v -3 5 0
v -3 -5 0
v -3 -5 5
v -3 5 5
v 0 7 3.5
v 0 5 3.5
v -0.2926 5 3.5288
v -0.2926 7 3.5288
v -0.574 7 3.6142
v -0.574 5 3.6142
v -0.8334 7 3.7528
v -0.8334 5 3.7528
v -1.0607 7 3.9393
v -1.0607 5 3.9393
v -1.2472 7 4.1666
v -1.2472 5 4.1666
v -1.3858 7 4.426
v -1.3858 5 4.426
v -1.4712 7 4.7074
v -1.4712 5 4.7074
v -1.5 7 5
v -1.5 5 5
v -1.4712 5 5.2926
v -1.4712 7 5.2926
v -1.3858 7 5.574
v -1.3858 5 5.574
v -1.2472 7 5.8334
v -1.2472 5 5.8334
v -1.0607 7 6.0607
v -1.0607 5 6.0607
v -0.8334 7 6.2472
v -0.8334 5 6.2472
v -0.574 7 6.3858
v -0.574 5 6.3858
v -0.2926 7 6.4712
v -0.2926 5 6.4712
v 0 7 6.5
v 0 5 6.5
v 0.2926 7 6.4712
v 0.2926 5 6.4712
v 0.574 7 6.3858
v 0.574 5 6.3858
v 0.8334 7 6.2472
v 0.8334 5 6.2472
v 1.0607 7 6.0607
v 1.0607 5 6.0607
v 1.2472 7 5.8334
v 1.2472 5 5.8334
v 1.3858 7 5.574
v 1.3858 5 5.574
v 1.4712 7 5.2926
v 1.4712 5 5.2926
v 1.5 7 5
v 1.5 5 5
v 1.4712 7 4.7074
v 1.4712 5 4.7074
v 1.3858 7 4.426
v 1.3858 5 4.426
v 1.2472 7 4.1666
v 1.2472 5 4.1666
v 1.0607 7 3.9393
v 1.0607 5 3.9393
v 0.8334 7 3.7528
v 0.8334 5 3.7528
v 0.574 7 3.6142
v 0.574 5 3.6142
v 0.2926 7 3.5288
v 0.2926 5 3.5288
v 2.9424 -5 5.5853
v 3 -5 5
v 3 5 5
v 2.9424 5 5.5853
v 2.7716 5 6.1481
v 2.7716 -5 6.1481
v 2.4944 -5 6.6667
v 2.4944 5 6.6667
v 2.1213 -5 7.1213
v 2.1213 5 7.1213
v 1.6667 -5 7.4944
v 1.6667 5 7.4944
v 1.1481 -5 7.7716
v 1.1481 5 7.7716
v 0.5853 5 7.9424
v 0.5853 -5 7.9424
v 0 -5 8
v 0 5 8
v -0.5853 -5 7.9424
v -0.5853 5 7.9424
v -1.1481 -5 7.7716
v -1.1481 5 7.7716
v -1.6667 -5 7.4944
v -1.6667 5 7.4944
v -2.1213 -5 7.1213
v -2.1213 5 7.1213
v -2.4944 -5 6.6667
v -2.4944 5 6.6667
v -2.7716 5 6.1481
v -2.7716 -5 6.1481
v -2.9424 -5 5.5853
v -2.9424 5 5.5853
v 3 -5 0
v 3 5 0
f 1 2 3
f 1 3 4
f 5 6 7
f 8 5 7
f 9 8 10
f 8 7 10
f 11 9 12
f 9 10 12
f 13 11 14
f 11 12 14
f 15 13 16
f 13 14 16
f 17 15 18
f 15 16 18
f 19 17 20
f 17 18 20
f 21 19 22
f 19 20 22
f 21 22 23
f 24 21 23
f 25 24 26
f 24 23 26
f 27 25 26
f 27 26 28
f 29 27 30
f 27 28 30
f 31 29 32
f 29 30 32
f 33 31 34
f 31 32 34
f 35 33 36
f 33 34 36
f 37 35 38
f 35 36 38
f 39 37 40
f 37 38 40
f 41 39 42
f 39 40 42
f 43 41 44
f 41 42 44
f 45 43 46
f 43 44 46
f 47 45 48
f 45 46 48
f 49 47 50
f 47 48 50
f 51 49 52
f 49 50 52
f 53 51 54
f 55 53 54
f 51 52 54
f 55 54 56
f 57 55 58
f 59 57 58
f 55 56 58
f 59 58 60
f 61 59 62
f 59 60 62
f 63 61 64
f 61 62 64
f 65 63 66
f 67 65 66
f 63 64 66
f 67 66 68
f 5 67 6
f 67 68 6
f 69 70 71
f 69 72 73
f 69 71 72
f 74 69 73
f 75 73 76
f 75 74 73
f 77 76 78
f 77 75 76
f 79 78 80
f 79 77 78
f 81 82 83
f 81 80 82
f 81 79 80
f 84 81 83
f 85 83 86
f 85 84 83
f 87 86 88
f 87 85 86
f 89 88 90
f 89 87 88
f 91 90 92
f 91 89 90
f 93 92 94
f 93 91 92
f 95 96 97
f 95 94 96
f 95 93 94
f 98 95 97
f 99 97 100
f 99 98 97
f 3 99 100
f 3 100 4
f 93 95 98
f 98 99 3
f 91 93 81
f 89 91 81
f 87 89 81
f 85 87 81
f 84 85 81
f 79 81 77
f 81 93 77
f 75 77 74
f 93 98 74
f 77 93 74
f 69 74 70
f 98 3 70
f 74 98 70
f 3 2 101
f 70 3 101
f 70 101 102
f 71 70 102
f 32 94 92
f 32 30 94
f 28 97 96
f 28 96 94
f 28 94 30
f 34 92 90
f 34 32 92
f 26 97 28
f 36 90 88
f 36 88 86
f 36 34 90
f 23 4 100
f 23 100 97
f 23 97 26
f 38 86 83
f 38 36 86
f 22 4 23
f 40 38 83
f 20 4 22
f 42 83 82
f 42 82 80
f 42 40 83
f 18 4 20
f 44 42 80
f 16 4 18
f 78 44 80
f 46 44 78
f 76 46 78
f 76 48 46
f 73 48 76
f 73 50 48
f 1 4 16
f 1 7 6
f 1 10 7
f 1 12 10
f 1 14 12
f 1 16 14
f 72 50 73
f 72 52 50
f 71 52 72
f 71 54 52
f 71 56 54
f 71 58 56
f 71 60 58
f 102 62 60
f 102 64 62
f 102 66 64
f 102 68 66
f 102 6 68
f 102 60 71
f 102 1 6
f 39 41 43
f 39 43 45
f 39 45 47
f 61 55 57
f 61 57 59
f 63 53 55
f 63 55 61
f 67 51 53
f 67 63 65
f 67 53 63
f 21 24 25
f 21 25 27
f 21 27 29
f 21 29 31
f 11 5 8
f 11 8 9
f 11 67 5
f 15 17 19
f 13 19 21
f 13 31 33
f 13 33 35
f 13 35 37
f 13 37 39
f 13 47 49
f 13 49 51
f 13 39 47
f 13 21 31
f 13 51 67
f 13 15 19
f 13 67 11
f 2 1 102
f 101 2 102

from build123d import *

# Parameters (mm, degrees)
SKETCH1_W           = 6
SKETCH1_H           = 10
BOSS_EXTRUDE1_DEPTH = 8
FILLET2_RADIUS      = 3
FILLET2_LENGTH      = 10
SKETCH2_R           = 1.5
BOSS_EXTRUDE2_DEPTH = 2


with BuildPart() as part:
    # Sketch1 → Boss-Extrude1 (new body)
    with BuildSketch(Plane.XY):
        Rectangle(SKETCH1_W, SKETCH1_H)
    extrude(amount=BOSS_EXTRUDE1_DEPTH)

    # Fillet2: full round fillet: the end face becomes a half cylinder, R = half its width
    fillet2_face = Plane((0, 0, 8), x_dir=(0, -1, 0), z_dir=(0, 0, 1))  # on the end face: x along it, z out of the body
    fillet2_slab = fillet2_face.offset(-FILLET2_RADIUS / 2) * Box(FILLET2_LENGTH, 2 * FILLET2_RADIUS, FILLET2_RADIUS, mode=Mode.PRIVATE)  # the body's end, R deep
    fillet2_round = Plane((0, 0, 5), x_dir=(0, 0, 1), z_dir=(0, -1, 0)) * Cylinder(FILLET2_RADIUS, FILLET2_LENGTH, mode=Mode.PRIVATE)  # its axis R under the face
    add(fillet2_slab - fillet2_round, mode=Mode.SUBTRACT)

    # Sketch2 → Boss-Extrude2 (add)
    with BuildSketch(Plane(origin=(0, 5, 0), x_dir=(1, 0, 0), z_dir=(0, 1, 0))):
        with Locations(Location((0, -5, 0), (0, 0, 90))):
            Circle(SKETCH2_R)
    extrude(amount=BOSS_EXTRUDE2_DEPTH)


solid = part.part
